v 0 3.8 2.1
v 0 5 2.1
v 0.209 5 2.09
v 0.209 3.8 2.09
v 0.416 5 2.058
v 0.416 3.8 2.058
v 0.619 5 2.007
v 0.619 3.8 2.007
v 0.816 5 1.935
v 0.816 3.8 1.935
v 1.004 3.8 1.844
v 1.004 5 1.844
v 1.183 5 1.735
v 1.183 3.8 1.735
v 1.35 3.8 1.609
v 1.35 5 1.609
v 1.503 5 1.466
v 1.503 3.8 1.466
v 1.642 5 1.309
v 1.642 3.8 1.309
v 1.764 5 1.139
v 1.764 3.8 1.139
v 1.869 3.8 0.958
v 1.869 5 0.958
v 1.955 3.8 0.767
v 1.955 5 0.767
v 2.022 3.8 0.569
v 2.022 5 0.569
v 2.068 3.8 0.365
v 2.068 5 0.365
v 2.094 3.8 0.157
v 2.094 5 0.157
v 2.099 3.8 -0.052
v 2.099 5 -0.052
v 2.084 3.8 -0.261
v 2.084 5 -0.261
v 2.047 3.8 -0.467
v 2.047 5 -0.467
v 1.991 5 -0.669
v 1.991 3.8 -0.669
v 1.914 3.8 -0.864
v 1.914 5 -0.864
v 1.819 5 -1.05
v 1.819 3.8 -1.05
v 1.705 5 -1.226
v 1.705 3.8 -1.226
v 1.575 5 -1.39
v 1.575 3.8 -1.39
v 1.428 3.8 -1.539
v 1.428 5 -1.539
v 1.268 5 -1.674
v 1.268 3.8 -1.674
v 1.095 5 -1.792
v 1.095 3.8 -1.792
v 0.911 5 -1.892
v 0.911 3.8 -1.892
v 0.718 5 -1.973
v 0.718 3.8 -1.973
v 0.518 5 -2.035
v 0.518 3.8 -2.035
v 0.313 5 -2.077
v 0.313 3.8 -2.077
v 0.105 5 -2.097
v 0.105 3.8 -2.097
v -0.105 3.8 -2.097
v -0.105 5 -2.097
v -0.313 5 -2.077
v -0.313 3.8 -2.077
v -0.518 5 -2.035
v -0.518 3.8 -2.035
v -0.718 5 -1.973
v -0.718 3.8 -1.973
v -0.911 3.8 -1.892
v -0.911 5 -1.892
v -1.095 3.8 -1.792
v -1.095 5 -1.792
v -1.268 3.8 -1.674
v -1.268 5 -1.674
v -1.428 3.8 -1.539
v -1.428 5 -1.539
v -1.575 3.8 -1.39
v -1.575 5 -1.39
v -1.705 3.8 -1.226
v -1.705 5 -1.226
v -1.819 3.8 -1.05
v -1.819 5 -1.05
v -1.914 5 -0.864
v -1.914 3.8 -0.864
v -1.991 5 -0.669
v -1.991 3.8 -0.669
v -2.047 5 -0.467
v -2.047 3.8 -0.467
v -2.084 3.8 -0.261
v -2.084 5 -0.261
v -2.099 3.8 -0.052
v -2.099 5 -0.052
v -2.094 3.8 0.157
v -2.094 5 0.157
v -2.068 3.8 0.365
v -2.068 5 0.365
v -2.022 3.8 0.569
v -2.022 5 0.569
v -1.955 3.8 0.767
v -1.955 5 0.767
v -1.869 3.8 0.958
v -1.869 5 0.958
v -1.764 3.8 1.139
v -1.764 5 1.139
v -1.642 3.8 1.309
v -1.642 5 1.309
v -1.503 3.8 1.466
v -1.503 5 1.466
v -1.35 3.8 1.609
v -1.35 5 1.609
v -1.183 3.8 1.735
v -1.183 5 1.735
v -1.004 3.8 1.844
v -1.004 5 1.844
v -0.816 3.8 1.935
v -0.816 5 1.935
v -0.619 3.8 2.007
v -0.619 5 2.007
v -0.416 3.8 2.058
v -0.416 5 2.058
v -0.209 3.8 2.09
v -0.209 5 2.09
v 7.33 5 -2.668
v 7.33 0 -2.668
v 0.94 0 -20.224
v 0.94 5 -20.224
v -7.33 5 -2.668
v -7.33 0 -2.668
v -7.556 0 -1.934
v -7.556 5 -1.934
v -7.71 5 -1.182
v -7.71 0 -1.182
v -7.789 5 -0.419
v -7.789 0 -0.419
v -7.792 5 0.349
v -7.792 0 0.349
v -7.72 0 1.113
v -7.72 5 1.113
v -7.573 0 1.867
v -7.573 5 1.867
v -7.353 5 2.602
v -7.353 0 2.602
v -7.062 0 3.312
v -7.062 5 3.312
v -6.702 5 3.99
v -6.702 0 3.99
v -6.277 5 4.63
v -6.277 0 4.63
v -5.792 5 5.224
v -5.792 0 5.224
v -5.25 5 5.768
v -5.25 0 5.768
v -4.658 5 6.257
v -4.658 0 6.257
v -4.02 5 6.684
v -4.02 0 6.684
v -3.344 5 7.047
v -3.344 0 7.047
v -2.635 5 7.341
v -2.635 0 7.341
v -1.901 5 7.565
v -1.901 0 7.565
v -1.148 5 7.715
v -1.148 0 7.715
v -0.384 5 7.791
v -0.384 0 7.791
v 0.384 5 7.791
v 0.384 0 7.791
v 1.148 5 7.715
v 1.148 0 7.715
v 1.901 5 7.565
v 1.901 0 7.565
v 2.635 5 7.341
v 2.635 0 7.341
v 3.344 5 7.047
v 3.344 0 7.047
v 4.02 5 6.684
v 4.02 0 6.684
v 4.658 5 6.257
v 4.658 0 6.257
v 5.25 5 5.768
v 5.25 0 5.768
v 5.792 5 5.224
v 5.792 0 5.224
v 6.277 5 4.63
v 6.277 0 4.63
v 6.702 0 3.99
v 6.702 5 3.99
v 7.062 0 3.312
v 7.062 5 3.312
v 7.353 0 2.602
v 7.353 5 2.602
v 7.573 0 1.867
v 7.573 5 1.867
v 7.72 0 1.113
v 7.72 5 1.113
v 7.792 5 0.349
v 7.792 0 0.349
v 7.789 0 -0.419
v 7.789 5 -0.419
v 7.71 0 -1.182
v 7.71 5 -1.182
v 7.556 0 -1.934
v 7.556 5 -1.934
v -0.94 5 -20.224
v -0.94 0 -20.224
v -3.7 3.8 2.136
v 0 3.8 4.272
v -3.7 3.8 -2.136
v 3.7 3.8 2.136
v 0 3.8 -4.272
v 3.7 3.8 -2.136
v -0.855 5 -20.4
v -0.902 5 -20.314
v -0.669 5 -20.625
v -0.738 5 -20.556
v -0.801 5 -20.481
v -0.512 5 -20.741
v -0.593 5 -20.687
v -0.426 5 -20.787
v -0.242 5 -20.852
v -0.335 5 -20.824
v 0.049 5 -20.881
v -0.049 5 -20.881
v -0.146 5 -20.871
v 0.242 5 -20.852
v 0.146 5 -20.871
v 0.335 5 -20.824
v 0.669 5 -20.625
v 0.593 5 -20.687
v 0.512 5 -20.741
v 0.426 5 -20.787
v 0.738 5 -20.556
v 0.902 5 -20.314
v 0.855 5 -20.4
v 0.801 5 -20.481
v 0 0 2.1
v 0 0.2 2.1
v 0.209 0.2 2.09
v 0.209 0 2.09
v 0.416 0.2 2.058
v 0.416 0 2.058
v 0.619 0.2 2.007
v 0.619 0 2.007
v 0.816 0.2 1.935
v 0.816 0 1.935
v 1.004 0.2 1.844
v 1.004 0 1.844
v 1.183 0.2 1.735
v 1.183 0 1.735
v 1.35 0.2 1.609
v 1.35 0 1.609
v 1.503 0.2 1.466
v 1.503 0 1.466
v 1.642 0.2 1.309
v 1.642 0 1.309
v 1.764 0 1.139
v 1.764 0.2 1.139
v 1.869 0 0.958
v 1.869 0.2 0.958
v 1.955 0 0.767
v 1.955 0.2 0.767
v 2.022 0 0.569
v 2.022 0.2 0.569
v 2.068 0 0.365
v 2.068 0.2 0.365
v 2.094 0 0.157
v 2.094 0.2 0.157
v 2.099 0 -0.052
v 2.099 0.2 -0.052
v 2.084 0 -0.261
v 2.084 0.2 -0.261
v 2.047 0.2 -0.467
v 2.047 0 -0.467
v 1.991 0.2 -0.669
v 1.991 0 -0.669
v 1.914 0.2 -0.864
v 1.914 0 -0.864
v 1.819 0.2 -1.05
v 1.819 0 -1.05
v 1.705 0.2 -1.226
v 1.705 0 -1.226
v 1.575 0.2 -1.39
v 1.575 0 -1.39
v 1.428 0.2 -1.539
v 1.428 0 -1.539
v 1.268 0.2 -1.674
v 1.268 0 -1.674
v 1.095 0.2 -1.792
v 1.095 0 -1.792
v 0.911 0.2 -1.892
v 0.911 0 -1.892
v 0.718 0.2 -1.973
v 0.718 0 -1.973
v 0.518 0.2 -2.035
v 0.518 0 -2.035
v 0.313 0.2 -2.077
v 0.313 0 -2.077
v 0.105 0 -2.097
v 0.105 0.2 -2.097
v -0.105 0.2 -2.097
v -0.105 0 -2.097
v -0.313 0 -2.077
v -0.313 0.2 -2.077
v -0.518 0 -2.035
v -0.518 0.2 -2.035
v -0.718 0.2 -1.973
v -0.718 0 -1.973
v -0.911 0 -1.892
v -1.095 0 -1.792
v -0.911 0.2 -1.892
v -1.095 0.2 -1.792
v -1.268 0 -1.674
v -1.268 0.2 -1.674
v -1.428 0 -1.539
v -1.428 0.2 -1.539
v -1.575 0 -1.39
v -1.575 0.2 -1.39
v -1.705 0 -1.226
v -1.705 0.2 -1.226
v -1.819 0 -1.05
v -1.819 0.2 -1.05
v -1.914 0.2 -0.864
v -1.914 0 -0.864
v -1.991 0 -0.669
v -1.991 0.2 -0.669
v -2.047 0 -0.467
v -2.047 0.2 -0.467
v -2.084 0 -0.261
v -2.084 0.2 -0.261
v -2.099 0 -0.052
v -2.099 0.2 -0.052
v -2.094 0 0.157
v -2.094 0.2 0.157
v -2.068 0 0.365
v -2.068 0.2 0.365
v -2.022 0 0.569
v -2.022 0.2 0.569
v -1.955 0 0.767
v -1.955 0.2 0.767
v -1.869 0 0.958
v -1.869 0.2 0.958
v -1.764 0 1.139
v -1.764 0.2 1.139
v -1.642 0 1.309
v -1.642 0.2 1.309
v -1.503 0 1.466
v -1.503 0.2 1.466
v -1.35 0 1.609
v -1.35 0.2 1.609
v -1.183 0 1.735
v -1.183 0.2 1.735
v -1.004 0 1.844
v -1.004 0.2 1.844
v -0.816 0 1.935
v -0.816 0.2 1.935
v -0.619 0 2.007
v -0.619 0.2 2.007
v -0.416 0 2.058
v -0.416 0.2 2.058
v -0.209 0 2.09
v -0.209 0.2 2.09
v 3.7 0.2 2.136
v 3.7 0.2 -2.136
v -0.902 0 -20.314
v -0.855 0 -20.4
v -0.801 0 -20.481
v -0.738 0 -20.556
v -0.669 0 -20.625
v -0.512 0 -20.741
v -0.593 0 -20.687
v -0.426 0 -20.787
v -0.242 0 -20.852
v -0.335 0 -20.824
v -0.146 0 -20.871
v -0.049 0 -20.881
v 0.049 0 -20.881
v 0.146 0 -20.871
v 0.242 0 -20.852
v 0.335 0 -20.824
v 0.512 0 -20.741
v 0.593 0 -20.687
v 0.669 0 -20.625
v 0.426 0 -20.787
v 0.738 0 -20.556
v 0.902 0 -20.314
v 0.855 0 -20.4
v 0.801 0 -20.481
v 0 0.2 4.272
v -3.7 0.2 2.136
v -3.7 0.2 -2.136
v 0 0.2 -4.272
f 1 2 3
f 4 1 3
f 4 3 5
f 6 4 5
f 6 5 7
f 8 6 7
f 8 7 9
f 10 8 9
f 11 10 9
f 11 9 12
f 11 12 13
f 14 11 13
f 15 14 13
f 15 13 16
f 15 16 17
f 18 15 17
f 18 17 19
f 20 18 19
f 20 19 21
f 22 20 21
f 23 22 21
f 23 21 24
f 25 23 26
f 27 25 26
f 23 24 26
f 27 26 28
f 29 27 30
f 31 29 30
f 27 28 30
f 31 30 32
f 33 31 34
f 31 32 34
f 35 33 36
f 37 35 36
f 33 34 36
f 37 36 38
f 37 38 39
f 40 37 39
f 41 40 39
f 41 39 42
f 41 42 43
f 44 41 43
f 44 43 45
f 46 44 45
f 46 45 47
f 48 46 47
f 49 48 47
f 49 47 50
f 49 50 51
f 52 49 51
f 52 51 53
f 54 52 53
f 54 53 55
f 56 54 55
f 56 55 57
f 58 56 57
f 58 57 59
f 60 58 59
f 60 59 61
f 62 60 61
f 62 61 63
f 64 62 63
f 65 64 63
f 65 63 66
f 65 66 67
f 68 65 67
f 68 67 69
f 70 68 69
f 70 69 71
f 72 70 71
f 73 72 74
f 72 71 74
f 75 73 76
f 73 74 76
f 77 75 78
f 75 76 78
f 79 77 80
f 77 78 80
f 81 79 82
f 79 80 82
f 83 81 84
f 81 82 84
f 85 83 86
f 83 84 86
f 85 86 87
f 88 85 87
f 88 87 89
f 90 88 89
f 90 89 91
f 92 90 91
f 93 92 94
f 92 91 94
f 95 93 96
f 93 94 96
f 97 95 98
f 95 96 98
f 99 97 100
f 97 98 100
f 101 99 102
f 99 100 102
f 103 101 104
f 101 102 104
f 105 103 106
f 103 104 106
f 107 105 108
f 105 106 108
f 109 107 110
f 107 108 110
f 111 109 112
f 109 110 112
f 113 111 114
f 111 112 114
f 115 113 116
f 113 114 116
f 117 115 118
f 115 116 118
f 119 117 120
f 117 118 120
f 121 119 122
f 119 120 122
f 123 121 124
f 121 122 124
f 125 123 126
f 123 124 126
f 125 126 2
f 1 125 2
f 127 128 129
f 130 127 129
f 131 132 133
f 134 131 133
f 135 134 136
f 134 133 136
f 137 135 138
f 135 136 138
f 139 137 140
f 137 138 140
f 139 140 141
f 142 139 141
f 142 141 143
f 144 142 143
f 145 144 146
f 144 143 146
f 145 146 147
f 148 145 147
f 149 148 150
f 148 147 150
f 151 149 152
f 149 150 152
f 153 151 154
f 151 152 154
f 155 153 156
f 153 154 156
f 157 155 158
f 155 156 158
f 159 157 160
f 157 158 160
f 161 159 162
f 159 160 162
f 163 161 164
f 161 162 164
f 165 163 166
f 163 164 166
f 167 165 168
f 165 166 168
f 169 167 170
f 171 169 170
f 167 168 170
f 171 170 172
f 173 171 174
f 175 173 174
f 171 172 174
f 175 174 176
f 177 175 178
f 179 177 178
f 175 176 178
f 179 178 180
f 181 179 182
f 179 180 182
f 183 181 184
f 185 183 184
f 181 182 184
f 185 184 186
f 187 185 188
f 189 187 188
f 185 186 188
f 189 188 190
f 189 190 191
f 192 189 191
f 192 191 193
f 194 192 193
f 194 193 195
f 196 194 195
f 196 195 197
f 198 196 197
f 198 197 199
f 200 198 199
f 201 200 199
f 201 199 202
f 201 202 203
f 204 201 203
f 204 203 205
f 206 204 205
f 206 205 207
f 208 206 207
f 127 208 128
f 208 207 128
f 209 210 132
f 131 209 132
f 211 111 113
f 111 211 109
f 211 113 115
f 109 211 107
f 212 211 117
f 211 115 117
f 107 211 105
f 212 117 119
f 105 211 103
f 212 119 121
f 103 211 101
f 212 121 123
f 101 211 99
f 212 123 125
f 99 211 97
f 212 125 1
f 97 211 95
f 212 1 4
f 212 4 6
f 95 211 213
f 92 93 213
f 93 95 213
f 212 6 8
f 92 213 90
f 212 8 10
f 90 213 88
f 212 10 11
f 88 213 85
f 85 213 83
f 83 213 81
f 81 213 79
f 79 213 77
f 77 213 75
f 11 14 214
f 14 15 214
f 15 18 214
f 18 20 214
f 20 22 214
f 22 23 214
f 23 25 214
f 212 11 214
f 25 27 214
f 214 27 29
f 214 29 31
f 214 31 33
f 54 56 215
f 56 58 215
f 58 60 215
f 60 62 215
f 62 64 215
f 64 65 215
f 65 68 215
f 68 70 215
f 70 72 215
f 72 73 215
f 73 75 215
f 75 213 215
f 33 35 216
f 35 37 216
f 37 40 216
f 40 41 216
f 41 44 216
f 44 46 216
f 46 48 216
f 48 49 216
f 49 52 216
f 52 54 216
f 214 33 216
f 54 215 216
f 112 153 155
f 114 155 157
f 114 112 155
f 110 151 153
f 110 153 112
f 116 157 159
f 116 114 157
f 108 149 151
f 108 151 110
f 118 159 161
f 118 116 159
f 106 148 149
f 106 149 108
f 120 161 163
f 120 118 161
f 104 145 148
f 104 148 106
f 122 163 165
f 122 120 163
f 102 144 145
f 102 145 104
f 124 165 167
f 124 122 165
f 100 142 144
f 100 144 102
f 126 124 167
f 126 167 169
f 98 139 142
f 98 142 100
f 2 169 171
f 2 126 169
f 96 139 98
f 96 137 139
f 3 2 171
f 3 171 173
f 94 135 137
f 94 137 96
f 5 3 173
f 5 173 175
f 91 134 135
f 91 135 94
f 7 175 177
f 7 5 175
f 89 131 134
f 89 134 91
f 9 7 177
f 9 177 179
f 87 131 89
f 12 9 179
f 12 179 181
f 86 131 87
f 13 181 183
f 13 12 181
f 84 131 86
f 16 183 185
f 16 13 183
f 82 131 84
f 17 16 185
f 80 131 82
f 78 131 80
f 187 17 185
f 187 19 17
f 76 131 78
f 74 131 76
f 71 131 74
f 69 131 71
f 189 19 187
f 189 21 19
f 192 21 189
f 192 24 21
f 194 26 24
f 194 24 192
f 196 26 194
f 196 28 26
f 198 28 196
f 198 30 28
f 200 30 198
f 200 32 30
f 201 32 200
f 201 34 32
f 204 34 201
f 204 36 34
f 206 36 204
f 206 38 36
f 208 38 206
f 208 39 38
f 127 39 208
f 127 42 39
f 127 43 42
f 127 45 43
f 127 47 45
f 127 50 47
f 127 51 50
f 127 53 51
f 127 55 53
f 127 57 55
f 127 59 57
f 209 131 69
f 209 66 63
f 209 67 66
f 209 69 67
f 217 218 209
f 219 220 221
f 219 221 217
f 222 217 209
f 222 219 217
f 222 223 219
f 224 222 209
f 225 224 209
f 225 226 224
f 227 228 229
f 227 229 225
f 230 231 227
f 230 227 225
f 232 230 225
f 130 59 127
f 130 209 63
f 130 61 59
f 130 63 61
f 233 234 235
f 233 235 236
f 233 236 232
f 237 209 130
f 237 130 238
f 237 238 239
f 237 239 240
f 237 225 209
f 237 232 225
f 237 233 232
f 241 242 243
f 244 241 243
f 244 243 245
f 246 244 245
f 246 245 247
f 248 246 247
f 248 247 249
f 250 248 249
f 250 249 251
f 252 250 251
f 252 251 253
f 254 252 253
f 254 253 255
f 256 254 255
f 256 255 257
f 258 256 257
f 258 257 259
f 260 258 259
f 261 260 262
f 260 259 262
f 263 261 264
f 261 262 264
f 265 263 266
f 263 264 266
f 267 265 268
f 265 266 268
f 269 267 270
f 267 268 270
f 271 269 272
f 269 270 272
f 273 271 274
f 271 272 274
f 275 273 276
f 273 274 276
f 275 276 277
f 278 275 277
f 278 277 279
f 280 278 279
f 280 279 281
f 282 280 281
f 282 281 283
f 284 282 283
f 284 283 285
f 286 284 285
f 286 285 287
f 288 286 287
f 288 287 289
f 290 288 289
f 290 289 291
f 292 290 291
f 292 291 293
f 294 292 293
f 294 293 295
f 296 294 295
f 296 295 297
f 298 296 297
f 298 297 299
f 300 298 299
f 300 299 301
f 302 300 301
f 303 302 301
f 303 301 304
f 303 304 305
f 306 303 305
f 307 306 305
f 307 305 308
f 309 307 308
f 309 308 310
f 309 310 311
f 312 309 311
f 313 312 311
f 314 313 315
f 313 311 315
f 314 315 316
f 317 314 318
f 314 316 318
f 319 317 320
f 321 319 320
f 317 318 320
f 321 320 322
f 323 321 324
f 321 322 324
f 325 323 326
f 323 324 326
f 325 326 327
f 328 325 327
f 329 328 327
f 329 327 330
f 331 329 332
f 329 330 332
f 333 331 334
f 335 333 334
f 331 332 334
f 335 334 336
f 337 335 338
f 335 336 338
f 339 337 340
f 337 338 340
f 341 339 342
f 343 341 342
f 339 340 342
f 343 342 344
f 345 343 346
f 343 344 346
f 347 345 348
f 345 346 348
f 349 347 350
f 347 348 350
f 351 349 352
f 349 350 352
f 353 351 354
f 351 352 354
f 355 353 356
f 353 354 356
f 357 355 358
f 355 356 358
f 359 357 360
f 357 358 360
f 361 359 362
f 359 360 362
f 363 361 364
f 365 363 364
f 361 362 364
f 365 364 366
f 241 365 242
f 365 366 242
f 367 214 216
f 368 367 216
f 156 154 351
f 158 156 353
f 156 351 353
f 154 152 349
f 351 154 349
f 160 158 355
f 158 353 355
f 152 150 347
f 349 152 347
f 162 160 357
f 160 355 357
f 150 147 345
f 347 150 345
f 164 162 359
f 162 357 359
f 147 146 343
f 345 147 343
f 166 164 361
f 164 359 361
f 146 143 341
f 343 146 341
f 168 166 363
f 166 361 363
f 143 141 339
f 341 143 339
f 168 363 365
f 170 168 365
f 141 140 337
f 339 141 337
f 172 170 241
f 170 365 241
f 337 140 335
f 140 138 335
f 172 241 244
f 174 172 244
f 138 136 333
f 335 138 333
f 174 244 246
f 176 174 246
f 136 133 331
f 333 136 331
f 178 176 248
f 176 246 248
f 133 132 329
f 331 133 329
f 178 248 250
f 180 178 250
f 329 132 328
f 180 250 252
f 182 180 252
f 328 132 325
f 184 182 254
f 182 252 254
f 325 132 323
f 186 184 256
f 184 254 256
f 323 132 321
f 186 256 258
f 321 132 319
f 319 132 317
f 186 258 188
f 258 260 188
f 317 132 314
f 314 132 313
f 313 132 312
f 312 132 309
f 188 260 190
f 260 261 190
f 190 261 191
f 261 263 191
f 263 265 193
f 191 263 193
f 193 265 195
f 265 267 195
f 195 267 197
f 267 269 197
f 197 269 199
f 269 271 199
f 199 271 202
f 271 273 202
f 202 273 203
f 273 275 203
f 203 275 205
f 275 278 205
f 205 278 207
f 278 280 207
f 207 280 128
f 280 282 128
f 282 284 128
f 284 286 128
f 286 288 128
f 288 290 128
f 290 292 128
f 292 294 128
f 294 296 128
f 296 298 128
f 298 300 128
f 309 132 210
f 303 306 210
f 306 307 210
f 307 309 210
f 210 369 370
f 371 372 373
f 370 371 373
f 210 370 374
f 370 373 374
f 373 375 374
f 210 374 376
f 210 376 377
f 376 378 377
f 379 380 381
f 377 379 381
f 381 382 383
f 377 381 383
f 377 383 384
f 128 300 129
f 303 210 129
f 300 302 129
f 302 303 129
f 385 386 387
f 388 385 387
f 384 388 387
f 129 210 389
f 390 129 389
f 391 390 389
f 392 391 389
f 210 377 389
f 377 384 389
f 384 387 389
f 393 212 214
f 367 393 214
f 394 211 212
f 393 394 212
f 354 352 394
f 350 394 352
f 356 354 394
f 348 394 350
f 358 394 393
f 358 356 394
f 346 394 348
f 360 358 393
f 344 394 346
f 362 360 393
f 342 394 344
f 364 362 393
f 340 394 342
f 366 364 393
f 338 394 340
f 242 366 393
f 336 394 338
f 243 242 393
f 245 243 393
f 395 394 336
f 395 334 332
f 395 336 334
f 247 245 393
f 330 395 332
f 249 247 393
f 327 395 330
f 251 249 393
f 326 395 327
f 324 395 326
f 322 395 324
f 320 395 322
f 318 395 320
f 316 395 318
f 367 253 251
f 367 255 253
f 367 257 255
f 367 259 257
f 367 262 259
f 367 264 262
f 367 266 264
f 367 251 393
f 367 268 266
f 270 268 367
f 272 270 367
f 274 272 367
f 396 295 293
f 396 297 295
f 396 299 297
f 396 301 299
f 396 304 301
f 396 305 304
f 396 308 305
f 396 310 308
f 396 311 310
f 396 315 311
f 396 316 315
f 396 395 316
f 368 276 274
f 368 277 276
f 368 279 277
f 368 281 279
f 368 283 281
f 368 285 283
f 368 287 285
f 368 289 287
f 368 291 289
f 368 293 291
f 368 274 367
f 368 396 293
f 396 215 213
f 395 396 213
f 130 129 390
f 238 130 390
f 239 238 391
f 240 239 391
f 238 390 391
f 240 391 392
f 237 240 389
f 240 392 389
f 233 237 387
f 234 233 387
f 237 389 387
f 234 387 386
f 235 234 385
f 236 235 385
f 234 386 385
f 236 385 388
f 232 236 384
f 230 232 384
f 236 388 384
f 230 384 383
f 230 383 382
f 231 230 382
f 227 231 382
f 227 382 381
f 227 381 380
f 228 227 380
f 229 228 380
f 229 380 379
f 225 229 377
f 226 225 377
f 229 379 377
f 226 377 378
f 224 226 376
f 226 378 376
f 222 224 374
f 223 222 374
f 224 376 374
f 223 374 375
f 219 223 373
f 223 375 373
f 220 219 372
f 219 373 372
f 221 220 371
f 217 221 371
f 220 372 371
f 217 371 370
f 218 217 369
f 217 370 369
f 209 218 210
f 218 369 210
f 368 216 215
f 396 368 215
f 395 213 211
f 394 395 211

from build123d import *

# Parameters (mm, degrees)
BOSS_EXTRUDE2_DEPTH = 5
CUT_EXTRUDE1_REACH  = 24.845
SKETCH3_R           = 2.1
CUT_EXTRUDE2_START  = -1.2
CUT_EXTRUDE2_DEPTH  = 3.6


with BuildPart() as part:
    # Sketch1 → Boss-Extrude2 (new body)
    with BuildSketch(Plane(origin=(0, 0, 0), x_dir=(1, 0, 0), z_dir=(0, 1, 0))):
        with BuildLine():
            Line((-0.939692556, 20.223890242), (-7.329602442, 2.667757118))
            ThreePointArc((-7.329602442, 2.667757118), (0, -7.8), (7.329602442, 2.667757118))
            Line((7.329602442, 2.667757118), (0.939692556, 20.223890242))
            ThreePointArc((0.939692556, 20.223890242), (0, 20.881870053), (-0.939692556, 20.223890242))
        make_face()
    extrude(amount=BOSS_EXTRUDE2_DEPTH)

    # Sketch3 → Cut-Extrude1 (cut, up to next)
    with BuildSketch(Plane(origin=(0, 5, 0), x_dir=(1, 0, 0), z_dir=(0, 1, 0)), mode=Mode.PRIVATE) as cut_extrude1_sk1:
        with Locations(Location((0, 0, 0), (0, 0, 270))):
            Circle(SKETCH3_R)
    cut_extrude1_tool1 = extrude(cut_extrude1_sk1.sketch, amount=-CUT_EXTRUDE1_REACH, mode=Mode.PRIVATE) & part.part
    add(cut_extrude1_tool1.solids().sort_by_distance((0, 5, 0))[0], mode=Mode.SUBTRACT)

    # Sketch4 → Cut-Extrude2 (cut)
    with BuildSketch(Plane(origin=(0, 5, 0), x_dir=(1, 0, 0), z_dir=(0, 1, 0)).offset(CUT_EXTRUDE2_START)):
        Polygon((0, 4.272391992), (-3.7, 2.136195996), (-3.7, -2.136195996), (0, -4.272391992), (3.7, -2.136195996), (3.7, 2.136195996), align=None)
    extrude(amount=-CUT_EXTRUDE2_DEPTH, mode=Mode.SUBTRACT)


solid = part.part
